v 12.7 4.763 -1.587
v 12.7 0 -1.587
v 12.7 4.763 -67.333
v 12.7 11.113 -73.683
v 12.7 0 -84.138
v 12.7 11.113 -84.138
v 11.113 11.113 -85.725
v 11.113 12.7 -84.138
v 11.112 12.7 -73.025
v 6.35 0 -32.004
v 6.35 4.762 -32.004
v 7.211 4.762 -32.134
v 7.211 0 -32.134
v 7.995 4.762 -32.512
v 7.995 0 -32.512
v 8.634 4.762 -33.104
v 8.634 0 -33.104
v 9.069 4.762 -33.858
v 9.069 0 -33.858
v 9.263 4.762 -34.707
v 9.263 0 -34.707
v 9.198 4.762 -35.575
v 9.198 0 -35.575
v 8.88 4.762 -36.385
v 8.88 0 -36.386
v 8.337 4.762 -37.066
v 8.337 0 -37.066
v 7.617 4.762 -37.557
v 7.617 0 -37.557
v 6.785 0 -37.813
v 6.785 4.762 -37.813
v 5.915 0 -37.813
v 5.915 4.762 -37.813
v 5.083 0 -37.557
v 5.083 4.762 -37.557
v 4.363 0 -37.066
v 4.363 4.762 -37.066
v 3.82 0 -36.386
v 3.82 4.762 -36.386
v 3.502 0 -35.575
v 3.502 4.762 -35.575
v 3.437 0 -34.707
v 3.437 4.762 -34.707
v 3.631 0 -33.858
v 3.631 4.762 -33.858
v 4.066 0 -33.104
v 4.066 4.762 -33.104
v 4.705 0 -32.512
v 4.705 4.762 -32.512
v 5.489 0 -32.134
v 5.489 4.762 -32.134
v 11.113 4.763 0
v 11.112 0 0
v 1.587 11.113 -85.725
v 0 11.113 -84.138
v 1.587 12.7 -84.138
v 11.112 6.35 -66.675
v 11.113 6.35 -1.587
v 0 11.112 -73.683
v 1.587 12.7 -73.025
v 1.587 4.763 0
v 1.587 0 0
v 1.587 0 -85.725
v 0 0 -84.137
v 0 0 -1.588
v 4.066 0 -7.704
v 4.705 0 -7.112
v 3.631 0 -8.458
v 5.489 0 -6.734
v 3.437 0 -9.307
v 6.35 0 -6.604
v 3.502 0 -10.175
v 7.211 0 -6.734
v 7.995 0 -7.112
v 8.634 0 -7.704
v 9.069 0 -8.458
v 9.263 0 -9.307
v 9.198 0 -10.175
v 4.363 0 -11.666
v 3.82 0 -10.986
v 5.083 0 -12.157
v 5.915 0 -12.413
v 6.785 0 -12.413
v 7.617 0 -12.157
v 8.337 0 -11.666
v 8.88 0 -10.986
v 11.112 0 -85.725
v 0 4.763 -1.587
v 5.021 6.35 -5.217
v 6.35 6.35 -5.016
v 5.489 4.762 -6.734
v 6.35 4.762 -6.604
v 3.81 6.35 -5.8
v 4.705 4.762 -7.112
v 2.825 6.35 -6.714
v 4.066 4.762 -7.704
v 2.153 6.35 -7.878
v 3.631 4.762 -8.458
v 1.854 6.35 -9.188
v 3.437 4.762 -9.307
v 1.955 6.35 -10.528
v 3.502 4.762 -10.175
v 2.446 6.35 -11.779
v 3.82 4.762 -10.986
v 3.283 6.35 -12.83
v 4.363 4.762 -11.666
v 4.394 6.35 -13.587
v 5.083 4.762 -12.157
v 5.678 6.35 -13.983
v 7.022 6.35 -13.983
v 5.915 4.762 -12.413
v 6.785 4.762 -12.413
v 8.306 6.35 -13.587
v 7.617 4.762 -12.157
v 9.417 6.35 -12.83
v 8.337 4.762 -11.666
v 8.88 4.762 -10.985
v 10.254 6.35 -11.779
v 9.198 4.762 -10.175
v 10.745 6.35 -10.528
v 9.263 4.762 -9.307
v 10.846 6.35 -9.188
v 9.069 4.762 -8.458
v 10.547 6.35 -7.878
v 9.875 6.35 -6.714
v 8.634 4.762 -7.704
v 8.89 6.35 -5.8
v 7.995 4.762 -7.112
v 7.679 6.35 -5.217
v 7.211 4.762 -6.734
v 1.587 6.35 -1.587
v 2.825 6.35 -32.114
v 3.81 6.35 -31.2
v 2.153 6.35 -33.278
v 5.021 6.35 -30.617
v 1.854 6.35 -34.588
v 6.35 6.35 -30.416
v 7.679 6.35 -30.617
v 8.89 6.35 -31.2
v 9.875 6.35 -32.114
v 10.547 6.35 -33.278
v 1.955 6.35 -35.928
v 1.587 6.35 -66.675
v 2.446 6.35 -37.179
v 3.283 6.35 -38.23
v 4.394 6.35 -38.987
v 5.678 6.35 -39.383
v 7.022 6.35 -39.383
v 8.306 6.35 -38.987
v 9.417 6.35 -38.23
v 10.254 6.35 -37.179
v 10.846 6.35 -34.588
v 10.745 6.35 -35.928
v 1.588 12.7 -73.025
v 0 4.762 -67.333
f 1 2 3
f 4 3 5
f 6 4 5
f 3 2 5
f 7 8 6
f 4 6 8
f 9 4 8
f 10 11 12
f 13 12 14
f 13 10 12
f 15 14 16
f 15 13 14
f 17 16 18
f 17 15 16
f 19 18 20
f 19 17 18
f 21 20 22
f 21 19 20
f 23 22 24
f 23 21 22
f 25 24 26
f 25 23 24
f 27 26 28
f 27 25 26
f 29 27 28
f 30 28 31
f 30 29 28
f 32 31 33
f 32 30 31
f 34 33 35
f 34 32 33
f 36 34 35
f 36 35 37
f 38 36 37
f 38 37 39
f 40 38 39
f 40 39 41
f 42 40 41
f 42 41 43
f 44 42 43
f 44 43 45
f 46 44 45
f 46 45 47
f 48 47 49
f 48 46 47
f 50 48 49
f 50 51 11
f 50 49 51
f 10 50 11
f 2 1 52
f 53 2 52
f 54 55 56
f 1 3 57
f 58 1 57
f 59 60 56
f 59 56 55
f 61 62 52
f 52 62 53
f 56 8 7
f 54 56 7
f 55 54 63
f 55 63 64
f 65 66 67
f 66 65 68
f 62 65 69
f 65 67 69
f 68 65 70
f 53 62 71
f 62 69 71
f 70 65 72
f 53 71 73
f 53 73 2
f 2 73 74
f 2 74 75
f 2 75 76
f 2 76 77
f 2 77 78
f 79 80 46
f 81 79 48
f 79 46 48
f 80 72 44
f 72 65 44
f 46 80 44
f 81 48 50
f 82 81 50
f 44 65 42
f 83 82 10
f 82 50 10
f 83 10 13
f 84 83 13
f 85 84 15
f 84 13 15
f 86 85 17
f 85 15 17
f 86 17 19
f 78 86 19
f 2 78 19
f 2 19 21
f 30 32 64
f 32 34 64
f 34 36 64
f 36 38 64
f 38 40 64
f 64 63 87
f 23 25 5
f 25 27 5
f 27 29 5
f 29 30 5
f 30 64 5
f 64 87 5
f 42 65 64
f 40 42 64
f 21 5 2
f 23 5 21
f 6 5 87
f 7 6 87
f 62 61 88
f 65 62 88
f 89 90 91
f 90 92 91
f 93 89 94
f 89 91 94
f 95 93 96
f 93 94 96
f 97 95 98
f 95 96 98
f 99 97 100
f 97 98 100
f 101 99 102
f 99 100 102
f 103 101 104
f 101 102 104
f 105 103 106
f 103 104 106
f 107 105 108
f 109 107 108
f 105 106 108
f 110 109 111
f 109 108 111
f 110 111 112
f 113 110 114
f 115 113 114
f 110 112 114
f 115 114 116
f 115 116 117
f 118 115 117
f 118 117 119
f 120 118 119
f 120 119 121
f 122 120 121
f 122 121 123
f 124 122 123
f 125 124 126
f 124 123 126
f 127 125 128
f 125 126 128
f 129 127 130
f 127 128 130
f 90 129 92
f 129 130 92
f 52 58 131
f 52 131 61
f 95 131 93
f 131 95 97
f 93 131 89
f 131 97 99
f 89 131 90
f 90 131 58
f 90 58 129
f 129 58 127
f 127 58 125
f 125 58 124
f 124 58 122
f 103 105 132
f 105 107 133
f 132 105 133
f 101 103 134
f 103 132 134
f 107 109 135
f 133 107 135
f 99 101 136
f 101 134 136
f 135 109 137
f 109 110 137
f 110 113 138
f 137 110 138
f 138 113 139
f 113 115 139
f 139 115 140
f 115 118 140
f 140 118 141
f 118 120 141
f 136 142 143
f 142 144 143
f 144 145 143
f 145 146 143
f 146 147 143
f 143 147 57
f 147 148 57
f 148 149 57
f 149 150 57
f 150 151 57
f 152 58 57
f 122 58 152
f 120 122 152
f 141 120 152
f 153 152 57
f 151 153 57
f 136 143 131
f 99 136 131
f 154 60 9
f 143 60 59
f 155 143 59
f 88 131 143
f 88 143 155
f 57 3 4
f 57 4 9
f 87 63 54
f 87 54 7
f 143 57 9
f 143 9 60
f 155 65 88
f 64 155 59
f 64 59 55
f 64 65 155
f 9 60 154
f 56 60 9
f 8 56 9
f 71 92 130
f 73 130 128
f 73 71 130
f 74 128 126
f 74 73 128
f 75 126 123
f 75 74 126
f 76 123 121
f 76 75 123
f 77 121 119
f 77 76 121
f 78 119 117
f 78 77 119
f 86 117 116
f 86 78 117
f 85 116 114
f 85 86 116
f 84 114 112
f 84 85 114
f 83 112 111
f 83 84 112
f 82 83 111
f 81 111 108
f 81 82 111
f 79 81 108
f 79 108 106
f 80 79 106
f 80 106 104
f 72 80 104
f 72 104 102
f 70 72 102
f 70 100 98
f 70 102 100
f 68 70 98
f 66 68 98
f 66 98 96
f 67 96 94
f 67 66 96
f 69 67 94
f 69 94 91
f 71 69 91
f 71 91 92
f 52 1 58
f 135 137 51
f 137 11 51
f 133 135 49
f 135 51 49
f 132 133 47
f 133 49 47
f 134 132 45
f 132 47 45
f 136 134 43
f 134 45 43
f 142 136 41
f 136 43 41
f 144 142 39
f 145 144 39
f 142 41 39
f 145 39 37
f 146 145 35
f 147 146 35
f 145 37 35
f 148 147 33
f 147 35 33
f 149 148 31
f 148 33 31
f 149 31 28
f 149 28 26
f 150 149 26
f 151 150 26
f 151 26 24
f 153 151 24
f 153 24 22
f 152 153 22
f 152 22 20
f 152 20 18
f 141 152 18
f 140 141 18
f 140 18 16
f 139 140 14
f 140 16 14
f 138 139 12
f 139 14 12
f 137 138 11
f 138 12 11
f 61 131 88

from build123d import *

# Parameters (mm, degrees)
SKETCH1_W           = 12.7
SKETCH1_H           = 85.725
SKETCH1_R           = 2.921
BOSS_EXTRUDE1_DEPTH = 12.7
SKETCH2_W           = 73.025
SKETCH2_H           = 6.35
CUT_EXTRUDE1_DEPTH  = 88.586275323
CHAMFER1_SIZE       = 6.35


# Some blends are built 0.0001 mm under size
with BuildPart() as part:
    # Sketch1 → Boss-Extrude1 (new body)
    with BuildSketch(Plane(origin=(0, 0, 0), x_dir=(1, 0, 0), z_dir=(0, 1, 0))):
        with Locations((6.35, 42.8625)):
            Rectangle(SKETCH1_W, SKETCH1_H)
        with Locations(Location((6.35, 9.525, 0), (0, 0, 270))):
            Circle(SKETCH1_R, mode=Mode.SUBTRACT)
        with Locations(Location((6.35, 34.925, 0), (0, 0, 270))):
            Circle(SKETCH1_R, mode=Mode.SUBTRACT)
    extrude(amount=BOSS_EXTRUDE1_DEPTH)

    # Sketch2 → Cut-Extrude1 (cut, through all)
    with BuildSketch(Plane(origin=(12.7, 0, 0), x_dir=(0, 0, -1), z_dir=(1, 0, 0))):
        with Locations((36.5125, 9.525)):
            Rectangle(SKETCH2_W, SKETCH2_H)
    extrude(amount=-CUT_EXTRUDE1_DEPTH, mode=Mode.SUBTRACT)

    # Chamfer1
    chamfer1_edges = [part.edges().sort_by_distance(p)[0] for p in [
        (6.35, 6.35, -73.025),
    ]]
    chamfer(chamfer1_edges, length=CHAMFER1_SIZE - 0.0001)  # a hair under: the kernel refuses the full size

    # Chamfer2
    # the kernel refuses this chamfer: 1.5875 mm, written as the material it takes off along each edge
    with BuildSketch(Plane(origin=(11.641666667, 11.641666667, -84.666666667), x_dir=(-0.7071067811865476, 0.7071067811865476, 0), z_dir=(0.5773502691896264, 0.5773502691896264, -0.5773502691896245)), Plane(origin=(1.058333333, 5.291666667, -1.058333333), x_dir=(0.7071067811865476, 0.7071067811865476, 0), z_dir=(-0.5773502691896265, 0.5773502691896265, 0.5773502691896244))) as chamfer2_piece_1:
        Polygon((-1.122532015, 0.648094161), (1.122532015, 0.648094161), (0, -1.296188322), align=None)
    extrude(amount=2.016395815, mode=Mode.SUBTRACT)
    with BuildSketch(Plane(origin=(1.058333333, 11.641666667, -84.666666667), x_dir=(0.7071067811865476, 0.7071067811865476, 0), z_dir=(-0.5773502691896264, 0.5773502691896264, -0.5773502691896245)), Plane(origin=(11.641666667, 5.291666667, -1.058333333), x_dir=(-0.7071067811865476, 0.7071067811865476, -2.571490011072639e-15), z_dir=(0.577350269189625, 0.5773502691896271, 0.5773502691896252))) as chamfer2_piece_2:
        Polygon((-1.122532015, -0.648094161), (1.122532015, -0.648094161), (0, 1.296188322), align=None)
    extrude(amount=2.016395815, mode=Mode.SUBTRACT)
    with BuildSketch(Plane(origin=(16.782546743, 12.7, -85.725), x_dir=(0, 0.027495876610586667, 0.9996219169112968), z_dir=(-1, 0, 0)), Plane(origin=(0, 12.7, -89.807546743), x_dir=(0.9996219169112968, 0.02749587661058674, 0), z_dir=(0, 0, 1)), Plane(origin=(0, -4.082546743, -85.725), x_dir=(0.9996219169112968, 0, -0.02749587661058565), z_dir=(0, 1, 0)), Plane(origin=(12.7, -4.082546743, -85.725), x_dir=(0.027495876610586667, 0, 0.9996219169112968), z_dir=(0, 1, 0))) as chamfer2_piece_3:
        with BuildLine():
            Line((1.633018697, 0), (-0.089768608, -1.630549497))
            Line((-0.089768608, -1.630549497), (-0.121506604, -1.629676503))
            ThreePointArc((-0.121506604, -1.629676503), (-0.054180148, -0.815019055), (-0.031737996, 0.000872994))
            Line((-0.031737996, 0.000872994), (0.000872994, 0.031737996))
            ThreePointArc((0.000872994, 0.031737996), (0.816765043, 0.009295844), (1.633891691, 0.031737996))
            Line((1.633891691, 0.031737996), (1.633018697, 0))
        make_face()
    extrude(amount=20.865093487, mode=Mode.SUBTRACT)
    with BuildSketch(Plane(origin=(12.7, 12.7, -68.942453257), x_dir=(0.027495876610586726, -0.9996219169112968, 0), z_dir=(0, 0, -1)), Plane(origin=(16.782546743, 6.35, 0), x_dir=(0, 0.027495876610586098, -0.9996219169112966), z_dir=(-1, 0, 0))) as chamfer2_piece_4:
        with BuildLine():
            Line((1.633018697, 0), (-0.089768608, 1.630549497))
            Line((-0.089768608, 1.630549497), (-0.121506604, 1.629676503))
            ThreePointArc((-0.121506604, 1.629676503), (-0.054180148, 0.815019055), (-0.031737996, -0.000872994))
            Line((-0.031737996, -0.000872994), (0.000872994, -0.031737996))
            ThreePointArc((0.000872994, -0.031737996), (0.816765043, -0.009295844), (1.633891691, -0.031737996))
            Line((1.633891691, -0.031737996), (1.633018697, 0))
        make_face()
    extrude(amount=20.865093487, mode=Mode.SUBTRACT)
    with BuildSketch(Plane(origin=(12.7, -4.082546743, 0), x_dir=(0.027495876610586743, 0, -0.9996219169112966), z_dir=(0, 1, 0)), Plane(origin=(0, -4.082546743, 0), x_dir=(0.9996219169112966, 0, 0.027495876610586424), z_dir=(0, 1, 0))) as chamfer2_piece_5:
        with BuildLine():
            Line((1.633018697, 0), (-0.089768608, 1.630549497))
            Line((-0.089768608, 1.630549497), (-0.121506604, 1.629676503))
            ThreePointArc((-0.121506604, 1.629676503), (-0.054180148, 0.815019055), (-0.031737996, -0.000872994))
            Line((-0.031737996, -0.000872994), (0.000872994, -0.031737996))
            ThreePointArc((0.000872994, -0.031737996), (0.816765043, -0.009295844), (1.633891691, -0.031737996))
            Line((1.633891691, -0.031737996), (1.633018697, 0))
        make_face()
    extrude(amount=14.515093487, mode=Mode.SUBTRACT)
    with BuildSketch(Plane(origin=(6.35, 6.35, -9.525), x_dir=(0, 0, 1), z_dir=(1, 0, 0))) as chamfer2_piece_6:
        with BuildLine():
            Line((4.553401281, -0.044901281), (2.876098719, 1.632401281))
            Line((2.876098719, 1.632401281), (2.844348719, 1.632401281))
            ThreePointArc((2.844348719, 1.632401281), (2.88925, 0.81620064), (2.88925, 0))
            Line((2.88925, 0), (2.921, -0.03175))
            ThreePointArc((2.921, -0.03175), (3.73720064, -0.03175), (4.553401281, -0.076651281))
            Line((4.553401281, -0.076651281), (4.553401281, -0.044901281))
        make_face()
    revolve(axis=Axis((6.35, 6.35, -9.525), (0, -1, 0)), mode=Mode.SUBTRACT)
    with BuildSketch(Plane(origin=(6.35, 6.35, -34.925), x_dir=(0, 0, 1), z_dir=(1, 0, 0))) as chamfer2_piece_7:
        with BuildLine():
            Line((4.553401281, -0.044901281), (2.876098719, 1.632401281))
            Line((2.876098719, 1.632401281), (2.844348719, 1.632401281))
            ThreePointArc((2.844348719, 1.632401281), (2.88925, 0.81620064), (2.88925, 0))
            Line((2.88925, 0), (2.921, -0.03175))
            ThreePointArc((2.921, -0.03175), (3.73720064, -0.03175), (4.553401281, -0.076651281))
            Line((4.553401281, -0.076651281), (4.553401281, -0.044901281))
        make_face()
    revolve(axis=Axis((6.35, 6.35, -34.925), (0, -1, 0)), mode=Mode.SUBTRACT)
    with BuildSketch(Plane(origin=(0, 6.35, -70.757646743), x_dir=(0.9996219169112968, 0.027495876610586195, 0), z_dir=(0, 0, 1))) as chamfer2_piece_8_section:
        with BuildLine():
            Line((1.633018697, 0), (-0.089768608, -1.630549497))
            Line((-0.089768608, -1.630549497), (-0.121506604, -1.629676503))
            ThreePointArc((-0.121506604, -1.629676503), (-0.054180148, -0.815019055), (-0.031737996, 0.000872994))
            Line((-0.031737996, 0.000872994), (0.000872994, 0.031737996))
            ThreePointArc((0.000872994, 0.031737996), (0.816765043, 0.009295844), (1.633891691, 0.031737996))
            Line((1.633891691, 0.031737996), (1.633018697, 0))
        make_face()
    chamfer2_piece_8 = extrude(amount=74.840193487, mode=Mode.PRIVATE)
    chamfer2_piece_8 = split(chamfer2_piece_8, bisect_by=Plane(origin=(0.524765539, -11.730363263, -48.594736737), z_dir=(0, 0.7071067811865479, 0.7071067811865472)), keep=Keep.TOP, mode=Mode.PRIVATE)
    add(chamfer2_piece_8, mode=Mode.SUBTRACT)
    with BuildSketch(Plane(origin=(12.7, 6.35, -70.757646743), x_dir=(0.02749587661058674, -0.9996219169112966, 0), z_dir=(0, 0, 1))) as chamfer2_piece_9_section:
        with BuildLine():
            Line((1.633018697, 0), (-0.089768608, -1.630549497))
            Line((-0.089768608, -1.630549497), (-0.121506604, -1.629676503))
            ThreePointArc((-0.121506604, -1.629676503), (-0.054180148, -0.815019055), (-0.031737996, 0.000872994))
            Line((-0.031737996, 0.000872994), (0.000872994, 0.031737996))
            ThreePointArc((0.000872994, 0.031737996), (0.816765043, 0.009295844), (1.633891691, 0.031737996))
            Line((1.633891691, 0.031737996), (1.633018697, 0))
        make_face()
    chamfer2_piece_9 = extrude(amount=74.840193487, mode=Mode.PRIVATE)
    chamfer2_piece_9 = split(chamfer2_piece_9, bisect_by=Plane(origin=(12.175234461, -11.730363263, -48.594736737), z_dir=(0, 0.7071067811865479, 0.7071067811865472)), keep=Keep.TOP, mode=Mode.PRIVATE)
    add(chamfer2_piece_9, mode=Mode.SUBTRACT)
    with BuildSketch(Plane(origin=(12.7, 3.463203513, -63.788303513), x_dir=(0.02749587661058664, -0.7068394360706738, -0.7068394360706732), z_dir=(0, 0.7071067811865472, -0.7071067811865479))) as chamfer2_piece_10_section:
        with BuildLine():
            Line((1.633018697, 0), (-0.089768608, 1.630549497))
            Line((-0.089768608, 1.630549497), (-0.121506604, 1.629676503))
            ThreePointArc((-0.121506604, 1.629676503), (-0.054180148, 0.815019055), (-0.031737996, -0.000872994))
            Line((-0.031737996, -0.000872994), (0.000872994, -0.031737996))
            ThreePointArc((0.000872994, -0.031737996), (0.816765043, -0.009295844), (1.633891691, -0.031737996))
            Line((1.633891691, -0.031737996), (1.633018697, 0))
        make_face()
    chamfer2_piece_10 = extrude(amount=17.145208187, mode=Mode.PRIVATE)
    chamfer2_piece_10 = split(chamfer2_piece_10, bisect_by=Plane(origin=(12.154882998, 6.35, -70.191724347), z_dir=(0, 1, 0)), keep=Keep.TOP, mode=Mode.PRIVATE)
    add(chamfer2_piece_10, mode=Mode.SUBTRACT)
    with BuildSketch(Plane(origin=(0, 3.463203513, -63.788303513), x_dir=(0.9996219169112968, 0.019442520806014586, 0.019442520806014572), z_dir=(0, 0.7071067811865472, -0.7071067811865479))) as chamfer2_piece_11_section:
        with BuildLine():
            Line((1.633018697, 0), (-0.089768608, 1.630549497))
            Line((-0.089768608, 1.630549497), (-0.121506604, 1.629676503))
            ThreePointArc((-0.121506604, 1.629676503), (-0.054180148, 0.815019055), (-0.031737996, -0.000872994))
            Line((-0.031737996, -0.000872994), (0.000872994, -0.031737996))
            ThreePointArc((0.000872994, -0.031737996), (0.816765043, -0.009295844), (1.633891691, -0.031737996))
            Line((1.633891691, -0.031737996), (1.633018697, 0))
        make_face()
    chamfer2_piece_11 = extrude(amount=17.145208187, mode=Mode.PRIVATE)
    chamfer2_piece_11 = split(chamfer2_piece_11, bisect_by=Plane(origin=(0.545117002, 6.35, -70.191724347), z_dir=(0, 1, 0)), keep=Keep.TOP, mode=Mode.PRIVATE)
    add(chamfer2_piece_11, mode=Mode.SUBTRACT)
    with BuildSketch(Plane(origin=(0, 3.463203513, -63.788303513), x_dir=(0.9996219169112968, 0.019442520806014586, 0.019442520806014572), z_dir=(0, 0.7071067811865472, -0.7071067811865479))) as chamfer2_piece_12a_section:
        with BuildLine():
            Line((1.633018697, 0), (-0.089768608, 1.630549497))
            Line((-0.089768608, 1.630549497), (-0.121506604, 1.629676503))
            ThreePointArc((-0.121506604, 1.629676503), (-0.054180148, 0.815019055), (-0.031737996, -0.000872994))
            Line((-0.031737996, -0.000872994), (0.000872994, -0.031737996))
            ThreePointArc((0.000872994, -0.031737996), (0.816765043, -0.009295844), (1.633891691, -0.031737996))
            Line((1.633891691, -0.031737996), (1.633018697, 0))
        make_face()
    chamfer2_piece_12a = extrude(amount=17.145208187, mode=Mode.PRIVATE)
    chamfer2_piece_12a = split(chamfer2_piece_12a, bisect_by=Plane(origin=(0.504972836, 6.35, -65.823859696), z_dir=(0, -1, 0)), keep=Keep.TOP, mode=Mode.PRIVATE)
    with BuildSketch(Plane(origin=(0, 6.35, -70.757646743), x_dir=(0.9996219169112968, 0.027495876610586195, 0), z_dir=(0, 0, 1))) as chamfer2_piece_12b_section:
        with BuildLine():
            Line((1.633018697, 0), (-0.089768608, -1.630549497))
            Line((-0.089768608, -1.630549497), (-0.121506604, -1.629676503))
            ThreePointArc((-0.121506604, -1.629676503), (-0.054180148, -0.815019055), (-0.031737996, 0.000872994))
            Line((-0.031737996, 0.000872994), (0.000872994, 0.031737996))
            ThreePointArc((0.000872994, 0.031737996), (0.816765043, 0.009295844), (1.633891691, 0.031737996))
            Line((1.633891691, 0.031737996), (1.633018697, 0))
        make_face()
    chamfer2_piece_12b = extrude(amount=74.840193487, mode=Mode.PRIVATE)
    chamfer2_piece_12b = split(chamfer2_piece_12b, bisect_by=Plane(origin=(0.504972836, 6.951917791, -67.277017791), z_dir=(0, -0.7071067811865479, -0.7071067811865472)), keep=Keep.TOP, mode=Mode.PRIVATE)
    chamfer2_piece_12 = chamfer2_piece_12a & chamfer2_piece_12b
    add(chamfer2_piece_12, mode=Mode.SUBTRACT)
    with BuildSketch(Plane(origin=(12.7, 3.463203513, -63.788303513), x_dir=(0.02749587661058664, -0.7068394360706738, -0.7068394360706732), z_dir=(0, 0.7071067811865472, -0.7071067811865479))) as chamfer2_piece_13a_section:
        with BuildLine():
            Line((1.633018697, 0), (-0.089768608, 1.630549497))
            Line((-0.089768608, 1.630549497), (-0.121506604, 1.629676503))
            ThreePointArc((-0.121506604, 1.629676503), (-0.054180148, 0.815019055), (-0.031737996, -0.000872994))
            Line((-0.031737996, -0.000872994), (0.000872994, -0.031737996))
            ThreePointArc((0.000872994, -0.031737996), (0.816765043, -0.009295844), (1.633891691, -0.031737996))
            Line((1.633891691, -0.031737996), (1.633018697, 0))
        make_face()
    chamfer2_piece_13a = extrude(amount=17.145208187, mode=Mode.PRIVATE)
    chamfer2_piece_13a = split(chamfer2_piece_13a, bisect_by=Plane(origin=(12.195027164, 6.35, -65.823859696), z_dir=(0, -1, 0)), keep=Keep.TOP, mode=Mode.PRIVATE)
    with BuildSketch(Plane(origin=(12.7, 6.35, -70.757646743), x_dir=(0.02749587661058674, -0.9996219169112966, 0), z_dir=(0, 0, 1))) as chamfer2_piece_13b_section:
        with BuildLine():
            Line((1.633018697, 0), (-0.089768608, -1.630549497))
            Line((-0.089768608, -1.630549497), (-0.121506604, -1.629676503))
            ThreePointArc((-0.121506604, -1.629676503), (-0.054180148, -0.815019055), (-0.031737996, 0.000872994))
            Line((-0.031737996, 0.000872994), (0.000872994, 0.031737996))
            ThreePointArc((0.000872994, 0.031737996), (0.816765043, 0.009295844), (1.633891691, 0.031737996))
            Line((1.633891691, 0.031737996), (1.633018697, 0))
        make_face()
    chamfer2_piece_13b = extrude(amount=74.840193487, mode=Mode.PRIVATE)
    chamfer2_piece_13b = split(chamfer2_piece_13b, bisect_by=Plane(origin=(12.195027164, 6.951917791, -67.277017791), z_dir=(0, -0.7071067811865479, -0.7071067811865472)), keep=Keep.TOP, mode=Mode.PRIVATE)
    chamfer2_piece_13 = chamfer2_piece_13a & chamfer2_piece_13b
    add(chamfer2_piece_13, mode=Mode.SUBTRACT)


solid = part.part
